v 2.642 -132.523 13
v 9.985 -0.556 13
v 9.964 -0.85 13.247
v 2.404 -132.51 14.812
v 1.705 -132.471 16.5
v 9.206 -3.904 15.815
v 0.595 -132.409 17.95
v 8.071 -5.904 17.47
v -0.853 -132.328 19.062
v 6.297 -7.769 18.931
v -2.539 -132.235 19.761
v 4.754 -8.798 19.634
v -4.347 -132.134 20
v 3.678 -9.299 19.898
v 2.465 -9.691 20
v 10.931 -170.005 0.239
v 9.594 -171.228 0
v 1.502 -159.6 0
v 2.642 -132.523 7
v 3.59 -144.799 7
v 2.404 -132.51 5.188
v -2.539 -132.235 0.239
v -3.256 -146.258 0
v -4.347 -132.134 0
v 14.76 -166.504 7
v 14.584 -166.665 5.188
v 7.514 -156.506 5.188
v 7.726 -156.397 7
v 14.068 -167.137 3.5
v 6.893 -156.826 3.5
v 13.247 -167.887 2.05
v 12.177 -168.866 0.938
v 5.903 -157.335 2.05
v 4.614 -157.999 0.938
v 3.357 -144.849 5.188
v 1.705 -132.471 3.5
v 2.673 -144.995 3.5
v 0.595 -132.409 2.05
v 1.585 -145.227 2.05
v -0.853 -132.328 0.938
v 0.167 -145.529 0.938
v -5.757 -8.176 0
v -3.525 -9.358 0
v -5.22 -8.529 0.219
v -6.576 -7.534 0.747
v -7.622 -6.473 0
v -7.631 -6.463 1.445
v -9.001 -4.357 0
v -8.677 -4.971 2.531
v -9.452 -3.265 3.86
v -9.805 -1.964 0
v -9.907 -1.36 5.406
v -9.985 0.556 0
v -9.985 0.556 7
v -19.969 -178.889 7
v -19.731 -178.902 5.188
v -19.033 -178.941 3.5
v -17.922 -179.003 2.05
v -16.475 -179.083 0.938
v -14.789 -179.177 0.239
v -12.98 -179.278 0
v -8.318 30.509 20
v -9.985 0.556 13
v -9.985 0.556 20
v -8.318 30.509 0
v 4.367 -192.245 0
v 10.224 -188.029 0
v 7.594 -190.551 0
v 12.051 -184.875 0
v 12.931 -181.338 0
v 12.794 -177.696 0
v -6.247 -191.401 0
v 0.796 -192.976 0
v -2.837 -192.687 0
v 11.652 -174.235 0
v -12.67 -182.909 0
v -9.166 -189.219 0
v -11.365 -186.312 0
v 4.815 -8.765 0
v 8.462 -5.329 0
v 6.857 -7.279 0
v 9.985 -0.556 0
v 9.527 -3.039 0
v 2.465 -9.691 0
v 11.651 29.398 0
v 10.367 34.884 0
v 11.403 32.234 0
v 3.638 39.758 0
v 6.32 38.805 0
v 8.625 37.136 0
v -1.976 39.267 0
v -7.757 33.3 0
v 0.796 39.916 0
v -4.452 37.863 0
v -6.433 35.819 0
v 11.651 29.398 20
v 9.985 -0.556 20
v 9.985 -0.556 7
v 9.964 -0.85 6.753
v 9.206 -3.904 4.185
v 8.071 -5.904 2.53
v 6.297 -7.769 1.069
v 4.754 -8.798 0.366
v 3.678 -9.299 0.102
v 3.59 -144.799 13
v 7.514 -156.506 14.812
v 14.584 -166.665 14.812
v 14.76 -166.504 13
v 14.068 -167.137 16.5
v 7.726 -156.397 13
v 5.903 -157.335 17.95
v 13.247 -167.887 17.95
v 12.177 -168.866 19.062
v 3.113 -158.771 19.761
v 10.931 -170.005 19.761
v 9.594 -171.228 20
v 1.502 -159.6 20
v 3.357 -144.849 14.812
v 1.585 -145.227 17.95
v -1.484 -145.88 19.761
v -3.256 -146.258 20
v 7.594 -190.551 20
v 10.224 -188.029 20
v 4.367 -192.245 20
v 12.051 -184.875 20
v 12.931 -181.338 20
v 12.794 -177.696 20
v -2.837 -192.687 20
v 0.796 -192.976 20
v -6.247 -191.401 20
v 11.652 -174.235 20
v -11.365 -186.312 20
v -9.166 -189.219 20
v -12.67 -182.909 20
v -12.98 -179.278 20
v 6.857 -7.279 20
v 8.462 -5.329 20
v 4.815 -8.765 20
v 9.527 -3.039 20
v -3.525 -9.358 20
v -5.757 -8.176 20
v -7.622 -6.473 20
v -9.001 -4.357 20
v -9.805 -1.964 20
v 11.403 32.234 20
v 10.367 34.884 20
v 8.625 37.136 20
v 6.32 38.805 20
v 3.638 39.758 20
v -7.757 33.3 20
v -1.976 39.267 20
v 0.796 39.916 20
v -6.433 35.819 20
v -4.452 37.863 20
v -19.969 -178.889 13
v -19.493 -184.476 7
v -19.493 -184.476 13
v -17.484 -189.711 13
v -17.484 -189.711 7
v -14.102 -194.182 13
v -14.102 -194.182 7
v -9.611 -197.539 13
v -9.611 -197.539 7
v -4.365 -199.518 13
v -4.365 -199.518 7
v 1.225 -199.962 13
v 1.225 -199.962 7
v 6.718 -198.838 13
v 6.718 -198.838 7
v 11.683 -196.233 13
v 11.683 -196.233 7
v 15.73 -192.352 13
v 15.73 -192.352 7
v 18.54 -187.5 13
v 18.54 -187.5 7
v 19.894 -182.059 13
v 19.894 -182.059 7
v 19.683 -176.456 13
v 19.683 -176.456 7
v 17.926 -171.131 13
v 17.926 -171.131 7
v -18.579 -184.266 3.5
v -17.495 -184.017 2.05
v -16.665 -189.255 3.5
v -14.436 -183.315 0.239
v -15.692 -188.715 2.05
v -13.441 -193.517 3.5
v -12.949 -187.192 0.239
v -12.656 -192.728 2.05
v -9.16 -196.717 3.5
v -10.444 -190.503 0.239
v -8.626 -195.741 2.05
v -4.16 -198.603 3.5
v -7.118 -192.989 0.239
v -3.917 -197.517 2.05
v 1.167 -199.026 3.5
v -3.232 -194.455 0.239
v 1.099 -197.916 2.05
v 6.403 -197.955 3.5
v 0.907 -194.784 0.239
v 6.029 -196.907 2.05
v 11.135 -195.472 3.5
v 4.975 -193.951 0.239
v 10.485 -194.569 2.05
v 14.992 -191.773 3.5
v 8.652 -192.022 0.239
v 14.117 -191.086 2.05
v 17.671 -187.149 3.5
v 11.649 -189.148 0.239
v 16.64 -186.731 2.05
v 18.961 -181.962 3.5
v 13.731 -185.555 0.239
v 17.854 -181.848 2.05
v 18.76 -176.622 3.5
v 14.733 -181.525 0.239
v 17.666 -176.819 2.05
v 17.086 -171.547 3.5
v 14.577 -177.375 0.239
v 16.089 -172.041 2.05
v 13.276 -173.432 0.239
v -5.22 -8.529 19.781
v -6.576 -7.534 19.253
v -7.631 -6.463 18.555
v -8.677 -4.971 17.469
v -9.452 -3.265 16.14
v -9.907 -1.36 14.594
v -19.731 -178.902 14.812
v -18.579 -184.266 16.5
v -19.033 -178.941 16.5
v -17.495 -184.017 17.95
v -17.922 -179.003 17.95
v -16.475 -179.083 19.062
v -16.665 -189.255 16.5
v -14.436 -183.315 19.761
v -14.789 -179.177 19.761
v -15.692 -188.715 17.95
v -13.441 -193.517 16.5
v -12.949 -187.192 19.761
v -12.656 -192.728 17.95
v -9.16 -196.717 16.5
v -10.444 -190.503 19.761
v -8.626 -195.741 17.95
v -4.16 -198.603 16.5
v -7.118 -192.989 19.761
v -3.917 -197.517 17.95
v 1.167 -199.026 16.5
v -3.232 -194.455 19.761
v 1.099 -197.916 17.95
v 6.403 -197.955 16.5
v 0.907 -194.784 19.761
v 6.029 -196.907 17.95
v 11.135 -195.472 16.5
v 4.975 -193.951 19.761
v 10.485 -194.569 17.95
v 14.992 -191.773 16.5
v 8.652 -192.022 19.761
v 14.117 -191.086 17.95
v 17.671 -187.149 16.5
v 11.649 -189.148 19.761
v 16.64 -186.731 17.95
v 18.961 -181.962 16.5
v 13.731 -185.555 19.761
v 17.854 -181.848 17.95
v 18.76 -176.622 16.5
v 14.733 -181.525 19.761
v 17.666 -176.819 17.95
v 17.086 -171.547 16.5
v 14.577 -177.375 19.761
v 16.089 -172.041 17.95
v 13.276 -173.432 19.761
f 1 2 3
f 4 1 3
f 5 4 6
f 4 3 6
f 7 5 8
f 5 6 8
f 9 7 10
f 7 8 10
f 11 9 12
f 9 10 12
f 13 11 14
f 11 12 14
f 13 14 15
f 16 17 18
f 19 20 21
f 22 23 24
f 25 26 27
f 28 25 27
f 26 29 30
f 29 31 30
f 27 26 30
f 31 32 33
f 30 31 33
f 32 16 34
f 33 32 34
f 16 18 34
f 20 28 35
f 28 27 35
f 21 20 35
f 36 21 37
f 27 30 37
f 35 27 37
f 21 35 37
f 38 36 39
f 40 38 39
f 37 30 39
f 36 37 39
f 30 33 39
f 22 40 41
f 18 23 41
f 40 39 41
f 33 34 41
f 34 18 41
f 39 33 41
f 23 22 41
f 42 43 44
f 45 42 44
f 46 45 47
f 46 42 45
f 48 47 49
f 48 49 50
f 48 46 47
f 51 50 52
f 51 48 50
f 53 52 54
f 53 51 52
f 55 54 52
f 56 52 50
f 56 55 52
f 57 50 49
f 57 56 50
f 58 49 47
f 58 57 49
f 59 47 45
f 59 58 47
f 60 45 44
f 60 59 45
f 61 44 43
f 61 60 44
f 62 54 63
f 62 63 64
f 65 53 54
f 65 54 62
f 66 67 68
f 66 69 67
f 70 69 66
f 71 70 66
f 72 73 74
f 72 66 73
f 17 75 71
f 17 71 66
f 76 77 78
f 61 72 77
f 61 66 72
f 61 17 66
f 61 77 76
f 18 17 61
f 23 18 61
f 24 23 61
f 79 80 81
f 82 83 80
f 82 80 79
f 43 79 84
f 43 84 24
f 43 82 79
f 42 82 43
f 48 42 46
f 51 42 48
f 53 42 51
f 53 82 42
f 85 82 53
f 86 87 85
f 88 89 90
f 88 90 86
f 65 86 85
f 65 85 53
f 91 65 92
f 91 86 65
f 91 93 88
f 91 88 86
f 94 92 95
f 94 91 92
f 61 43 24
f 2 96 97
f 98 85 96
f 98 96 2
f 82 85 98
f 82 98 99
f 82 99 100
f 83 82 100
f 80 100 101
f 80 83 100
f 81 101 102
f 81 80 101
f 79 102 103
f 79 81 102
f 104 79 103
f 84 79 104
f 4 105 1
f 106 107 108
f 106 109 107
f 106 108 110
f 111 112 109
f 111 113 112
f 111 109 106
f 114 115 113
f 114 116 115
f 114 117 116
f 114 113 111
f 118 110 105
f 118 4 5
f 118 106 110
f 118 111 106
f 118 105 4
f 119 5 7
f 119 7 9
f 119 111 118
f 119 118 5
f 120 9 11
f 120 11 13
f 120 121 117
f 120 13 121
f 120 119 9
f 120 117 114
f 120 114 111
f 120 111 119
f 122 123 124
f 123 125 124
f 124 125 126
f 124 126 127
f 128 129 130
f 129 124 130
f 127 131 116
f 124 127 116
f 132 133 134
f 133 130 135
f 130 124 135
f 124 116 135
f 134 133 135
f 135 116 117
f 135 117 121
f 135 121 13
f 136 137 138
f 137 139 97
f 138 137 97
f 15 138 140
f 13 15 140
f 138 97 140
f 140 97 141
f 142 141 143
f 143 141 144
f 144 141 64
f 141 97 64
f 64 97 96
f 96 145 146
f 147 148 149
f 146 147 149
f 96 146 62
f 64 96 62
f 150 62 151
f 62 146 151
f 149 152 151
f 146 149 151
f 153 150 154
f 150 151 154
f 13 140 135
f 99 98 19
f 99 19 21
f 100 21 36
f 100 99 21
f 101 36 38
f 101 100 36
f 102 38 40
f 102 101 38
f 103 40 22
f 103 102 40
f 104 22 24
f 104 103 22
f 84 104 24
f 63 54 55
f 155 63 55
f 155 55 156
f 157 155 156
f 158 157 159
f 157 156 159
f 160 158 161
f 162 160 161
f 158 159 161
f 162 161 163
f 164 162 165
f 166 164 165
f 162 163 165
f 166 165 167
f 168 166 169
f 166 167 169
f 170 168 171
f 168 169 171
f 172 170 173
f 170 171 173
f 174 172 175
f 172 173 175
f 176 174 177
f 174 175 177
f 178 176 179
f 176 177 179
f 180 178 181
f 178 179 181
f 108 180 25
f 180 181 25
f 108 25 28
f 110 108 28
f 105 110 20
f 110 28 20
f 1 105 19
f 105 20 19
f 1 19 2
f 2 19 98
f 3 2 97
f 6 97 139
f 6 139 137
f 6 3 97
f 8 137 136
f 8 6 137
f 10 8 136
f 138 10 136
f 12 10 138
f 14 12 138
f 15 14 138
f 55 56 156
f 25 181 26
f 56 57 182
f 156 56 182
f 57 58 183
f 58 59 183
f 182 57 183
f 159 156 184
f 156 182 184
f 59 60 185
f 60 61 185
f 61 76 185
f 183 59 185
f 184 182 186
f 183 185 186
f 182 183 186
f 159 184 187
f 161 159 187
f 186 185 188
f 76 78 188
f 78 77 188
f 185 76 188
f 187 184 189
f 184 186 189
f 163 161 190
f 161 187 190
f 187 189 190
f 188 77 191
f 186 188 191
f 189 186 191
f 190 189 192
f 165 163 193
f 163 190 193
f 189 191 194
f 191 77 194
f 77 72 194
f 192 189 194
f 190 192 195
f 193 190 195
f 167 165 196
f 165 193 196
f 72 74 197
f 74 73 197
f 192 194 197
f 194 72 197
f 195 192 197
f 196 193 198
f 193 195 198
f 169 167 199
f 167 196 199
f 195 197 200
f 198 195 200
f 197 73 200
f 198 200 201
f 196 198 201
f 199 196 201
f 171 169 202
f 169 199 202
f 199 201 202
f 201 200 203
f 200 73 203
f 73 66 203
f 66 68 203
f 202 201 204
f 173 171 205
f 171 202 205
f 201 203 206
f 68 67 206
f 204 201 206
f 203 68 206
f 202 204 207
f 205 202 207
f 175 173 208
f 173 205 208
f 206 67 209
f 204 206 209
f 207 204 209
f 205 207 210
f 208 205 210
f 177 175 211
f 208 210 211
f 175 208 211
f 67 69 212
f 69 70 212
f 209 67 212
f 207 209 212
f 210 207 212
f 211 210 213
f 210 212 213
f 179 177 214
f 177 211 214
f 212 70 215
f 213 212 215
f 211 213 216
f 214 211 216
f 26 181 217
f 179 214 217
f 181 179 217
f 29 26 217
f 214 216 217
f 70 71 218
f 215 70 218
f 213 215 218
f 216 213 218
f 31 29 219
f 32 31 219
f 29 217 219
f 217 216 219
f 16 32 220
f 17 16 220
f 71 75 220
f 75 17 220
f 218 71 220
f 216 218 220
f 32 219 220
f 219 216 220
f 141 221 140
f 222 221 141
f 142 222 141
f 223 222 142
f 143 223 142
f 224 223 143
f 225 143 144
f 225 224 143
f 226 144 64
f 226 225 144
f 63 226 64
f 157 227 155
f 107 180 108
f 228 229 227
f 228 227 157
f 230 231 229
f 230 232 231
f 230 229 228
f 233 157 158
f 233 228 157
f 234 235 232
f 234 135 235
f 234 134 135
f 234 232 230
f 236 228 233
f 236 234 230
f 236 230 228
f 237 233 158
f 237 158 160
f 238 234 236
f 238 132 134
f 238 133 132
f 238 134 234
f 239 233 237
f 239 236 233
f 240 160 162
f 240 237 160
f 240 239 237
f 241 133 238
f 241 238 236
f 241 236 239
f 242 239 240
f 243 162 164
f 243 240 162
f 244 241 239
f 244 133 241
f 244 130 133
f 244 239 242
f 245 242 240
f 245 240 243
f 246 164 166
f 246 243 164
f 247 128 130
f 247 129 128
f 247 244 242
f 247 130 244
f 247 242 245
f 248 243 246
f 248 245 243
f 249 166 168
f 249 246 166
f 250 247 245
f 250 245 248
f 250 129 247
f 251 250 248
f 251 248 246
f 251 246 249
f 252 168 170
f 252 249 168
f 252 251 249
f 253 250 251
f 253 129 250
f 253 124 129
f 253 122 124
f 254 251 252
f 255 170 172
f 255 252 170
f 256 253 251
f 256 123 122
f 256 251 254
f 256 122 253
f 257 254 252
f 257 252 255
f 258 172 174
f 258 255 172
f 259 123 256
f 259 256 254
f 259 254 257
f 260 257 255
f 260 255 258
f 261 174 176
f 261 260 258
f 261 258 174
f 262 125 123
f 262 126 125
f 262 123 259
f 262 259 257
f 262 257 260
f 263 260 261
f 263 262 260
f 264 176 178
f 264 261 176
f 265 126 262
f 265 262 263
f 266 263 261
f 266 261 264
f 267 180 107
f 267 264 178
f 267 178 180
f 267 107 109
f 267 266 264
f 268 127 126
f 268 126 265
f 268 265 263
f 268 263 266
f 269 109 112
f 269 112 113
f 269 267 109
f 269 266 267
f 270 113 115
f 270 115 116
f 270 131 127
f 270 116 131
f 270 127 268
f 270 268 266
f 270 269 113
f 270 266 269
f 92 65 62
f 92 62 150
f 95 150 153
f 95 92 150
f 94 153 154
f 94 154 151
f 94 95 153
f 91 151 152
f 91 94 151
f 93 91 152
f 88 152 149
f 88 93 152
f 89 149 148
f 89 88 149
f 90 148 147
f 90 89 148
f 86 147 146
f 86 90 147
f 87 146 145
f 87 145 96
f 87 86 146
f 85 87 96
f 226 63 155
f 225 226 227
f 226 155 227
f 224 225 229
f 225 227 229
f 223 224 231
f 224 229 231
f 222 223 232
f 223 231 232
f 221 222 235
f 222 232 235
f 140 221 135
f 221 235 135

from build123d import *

# Parameters (mm, degrees)
EXTRUDE_1_DEPTH = 20
FILLET_1_R      = 7
EXTRUDE_2_DEPTH = 20


with BuildPart() as part:
    # 草图1 → 凸台-拉伸1 (new body)
    with BuildSketch(Plane.XY):
        with BuildLine():
            Line((-9.984555975, 0.555555556), (-19.969111951, -178.888888889))
            ThreePointArc((-19.969111951, -178.888888889), (6.717955109, -198.837969083), (14.759919727, -166.503897983))
            ThreePointArc((14.759919727, -166.503897983), (5.273090806, -150.735790608), (2.641695759, -132.52291348))
            Line((2.641695759, -132.52291348), (9.984555975, -0.555555556))
            ThreePointArc((9.984555975, -0.555555556), (0.555555556, 9.984555975), (-9.984555975, 0.555555556))
        make_face()
    extrude(amount=EXTRUDE_1_DEPTH)

    # 圆角1
    fillet_1_edges = [part.edges().sort_by_distance(p)[0] for p in [
        (6.313125867, -66.539234518, 20),
        (0.555555556, 9.984555975, 20),
        (-14.976833963, -89.166666667, 20),
        (6.717955109, -198.837969083, 20),
        (-14.976833963, -89.166666667, 0),
        (0.555555556, 9.984555975, 0),
        (6.313125867, -66.539234518, 0),
        (5.273090806, -150.735790608, 0),
        (6.717955109, -198.837969083, 0),
        (5.273090806, -150.735790608, 20),
    ]]
    fillet(fillet_1_edges, radius=FILLET_1_R)

    # 草图2 → 凸台-拉伸2 (add)
    with BuildSketch(Plane.XY):
        with BuildLine():
            Line((-9.984555975, 0.555555556), (-8.317889309, 30.509223482))
            ThreePointArc((-8.317889309, 30.509223482), (2.222222222, 39.938223901), (11.651222642, 29.39811237))
            Line((11.651222642, 29.39811237), (9.984555975, -0.555555556))
            ThreePointArc((9.984555975, -0.555555556), (-0.555555556, -9.984555975), (-9.984555975, 0.555555556))
        make_face()
    extrude(amount=EXTRUDE_2_DEPTH)


solid = part.part
